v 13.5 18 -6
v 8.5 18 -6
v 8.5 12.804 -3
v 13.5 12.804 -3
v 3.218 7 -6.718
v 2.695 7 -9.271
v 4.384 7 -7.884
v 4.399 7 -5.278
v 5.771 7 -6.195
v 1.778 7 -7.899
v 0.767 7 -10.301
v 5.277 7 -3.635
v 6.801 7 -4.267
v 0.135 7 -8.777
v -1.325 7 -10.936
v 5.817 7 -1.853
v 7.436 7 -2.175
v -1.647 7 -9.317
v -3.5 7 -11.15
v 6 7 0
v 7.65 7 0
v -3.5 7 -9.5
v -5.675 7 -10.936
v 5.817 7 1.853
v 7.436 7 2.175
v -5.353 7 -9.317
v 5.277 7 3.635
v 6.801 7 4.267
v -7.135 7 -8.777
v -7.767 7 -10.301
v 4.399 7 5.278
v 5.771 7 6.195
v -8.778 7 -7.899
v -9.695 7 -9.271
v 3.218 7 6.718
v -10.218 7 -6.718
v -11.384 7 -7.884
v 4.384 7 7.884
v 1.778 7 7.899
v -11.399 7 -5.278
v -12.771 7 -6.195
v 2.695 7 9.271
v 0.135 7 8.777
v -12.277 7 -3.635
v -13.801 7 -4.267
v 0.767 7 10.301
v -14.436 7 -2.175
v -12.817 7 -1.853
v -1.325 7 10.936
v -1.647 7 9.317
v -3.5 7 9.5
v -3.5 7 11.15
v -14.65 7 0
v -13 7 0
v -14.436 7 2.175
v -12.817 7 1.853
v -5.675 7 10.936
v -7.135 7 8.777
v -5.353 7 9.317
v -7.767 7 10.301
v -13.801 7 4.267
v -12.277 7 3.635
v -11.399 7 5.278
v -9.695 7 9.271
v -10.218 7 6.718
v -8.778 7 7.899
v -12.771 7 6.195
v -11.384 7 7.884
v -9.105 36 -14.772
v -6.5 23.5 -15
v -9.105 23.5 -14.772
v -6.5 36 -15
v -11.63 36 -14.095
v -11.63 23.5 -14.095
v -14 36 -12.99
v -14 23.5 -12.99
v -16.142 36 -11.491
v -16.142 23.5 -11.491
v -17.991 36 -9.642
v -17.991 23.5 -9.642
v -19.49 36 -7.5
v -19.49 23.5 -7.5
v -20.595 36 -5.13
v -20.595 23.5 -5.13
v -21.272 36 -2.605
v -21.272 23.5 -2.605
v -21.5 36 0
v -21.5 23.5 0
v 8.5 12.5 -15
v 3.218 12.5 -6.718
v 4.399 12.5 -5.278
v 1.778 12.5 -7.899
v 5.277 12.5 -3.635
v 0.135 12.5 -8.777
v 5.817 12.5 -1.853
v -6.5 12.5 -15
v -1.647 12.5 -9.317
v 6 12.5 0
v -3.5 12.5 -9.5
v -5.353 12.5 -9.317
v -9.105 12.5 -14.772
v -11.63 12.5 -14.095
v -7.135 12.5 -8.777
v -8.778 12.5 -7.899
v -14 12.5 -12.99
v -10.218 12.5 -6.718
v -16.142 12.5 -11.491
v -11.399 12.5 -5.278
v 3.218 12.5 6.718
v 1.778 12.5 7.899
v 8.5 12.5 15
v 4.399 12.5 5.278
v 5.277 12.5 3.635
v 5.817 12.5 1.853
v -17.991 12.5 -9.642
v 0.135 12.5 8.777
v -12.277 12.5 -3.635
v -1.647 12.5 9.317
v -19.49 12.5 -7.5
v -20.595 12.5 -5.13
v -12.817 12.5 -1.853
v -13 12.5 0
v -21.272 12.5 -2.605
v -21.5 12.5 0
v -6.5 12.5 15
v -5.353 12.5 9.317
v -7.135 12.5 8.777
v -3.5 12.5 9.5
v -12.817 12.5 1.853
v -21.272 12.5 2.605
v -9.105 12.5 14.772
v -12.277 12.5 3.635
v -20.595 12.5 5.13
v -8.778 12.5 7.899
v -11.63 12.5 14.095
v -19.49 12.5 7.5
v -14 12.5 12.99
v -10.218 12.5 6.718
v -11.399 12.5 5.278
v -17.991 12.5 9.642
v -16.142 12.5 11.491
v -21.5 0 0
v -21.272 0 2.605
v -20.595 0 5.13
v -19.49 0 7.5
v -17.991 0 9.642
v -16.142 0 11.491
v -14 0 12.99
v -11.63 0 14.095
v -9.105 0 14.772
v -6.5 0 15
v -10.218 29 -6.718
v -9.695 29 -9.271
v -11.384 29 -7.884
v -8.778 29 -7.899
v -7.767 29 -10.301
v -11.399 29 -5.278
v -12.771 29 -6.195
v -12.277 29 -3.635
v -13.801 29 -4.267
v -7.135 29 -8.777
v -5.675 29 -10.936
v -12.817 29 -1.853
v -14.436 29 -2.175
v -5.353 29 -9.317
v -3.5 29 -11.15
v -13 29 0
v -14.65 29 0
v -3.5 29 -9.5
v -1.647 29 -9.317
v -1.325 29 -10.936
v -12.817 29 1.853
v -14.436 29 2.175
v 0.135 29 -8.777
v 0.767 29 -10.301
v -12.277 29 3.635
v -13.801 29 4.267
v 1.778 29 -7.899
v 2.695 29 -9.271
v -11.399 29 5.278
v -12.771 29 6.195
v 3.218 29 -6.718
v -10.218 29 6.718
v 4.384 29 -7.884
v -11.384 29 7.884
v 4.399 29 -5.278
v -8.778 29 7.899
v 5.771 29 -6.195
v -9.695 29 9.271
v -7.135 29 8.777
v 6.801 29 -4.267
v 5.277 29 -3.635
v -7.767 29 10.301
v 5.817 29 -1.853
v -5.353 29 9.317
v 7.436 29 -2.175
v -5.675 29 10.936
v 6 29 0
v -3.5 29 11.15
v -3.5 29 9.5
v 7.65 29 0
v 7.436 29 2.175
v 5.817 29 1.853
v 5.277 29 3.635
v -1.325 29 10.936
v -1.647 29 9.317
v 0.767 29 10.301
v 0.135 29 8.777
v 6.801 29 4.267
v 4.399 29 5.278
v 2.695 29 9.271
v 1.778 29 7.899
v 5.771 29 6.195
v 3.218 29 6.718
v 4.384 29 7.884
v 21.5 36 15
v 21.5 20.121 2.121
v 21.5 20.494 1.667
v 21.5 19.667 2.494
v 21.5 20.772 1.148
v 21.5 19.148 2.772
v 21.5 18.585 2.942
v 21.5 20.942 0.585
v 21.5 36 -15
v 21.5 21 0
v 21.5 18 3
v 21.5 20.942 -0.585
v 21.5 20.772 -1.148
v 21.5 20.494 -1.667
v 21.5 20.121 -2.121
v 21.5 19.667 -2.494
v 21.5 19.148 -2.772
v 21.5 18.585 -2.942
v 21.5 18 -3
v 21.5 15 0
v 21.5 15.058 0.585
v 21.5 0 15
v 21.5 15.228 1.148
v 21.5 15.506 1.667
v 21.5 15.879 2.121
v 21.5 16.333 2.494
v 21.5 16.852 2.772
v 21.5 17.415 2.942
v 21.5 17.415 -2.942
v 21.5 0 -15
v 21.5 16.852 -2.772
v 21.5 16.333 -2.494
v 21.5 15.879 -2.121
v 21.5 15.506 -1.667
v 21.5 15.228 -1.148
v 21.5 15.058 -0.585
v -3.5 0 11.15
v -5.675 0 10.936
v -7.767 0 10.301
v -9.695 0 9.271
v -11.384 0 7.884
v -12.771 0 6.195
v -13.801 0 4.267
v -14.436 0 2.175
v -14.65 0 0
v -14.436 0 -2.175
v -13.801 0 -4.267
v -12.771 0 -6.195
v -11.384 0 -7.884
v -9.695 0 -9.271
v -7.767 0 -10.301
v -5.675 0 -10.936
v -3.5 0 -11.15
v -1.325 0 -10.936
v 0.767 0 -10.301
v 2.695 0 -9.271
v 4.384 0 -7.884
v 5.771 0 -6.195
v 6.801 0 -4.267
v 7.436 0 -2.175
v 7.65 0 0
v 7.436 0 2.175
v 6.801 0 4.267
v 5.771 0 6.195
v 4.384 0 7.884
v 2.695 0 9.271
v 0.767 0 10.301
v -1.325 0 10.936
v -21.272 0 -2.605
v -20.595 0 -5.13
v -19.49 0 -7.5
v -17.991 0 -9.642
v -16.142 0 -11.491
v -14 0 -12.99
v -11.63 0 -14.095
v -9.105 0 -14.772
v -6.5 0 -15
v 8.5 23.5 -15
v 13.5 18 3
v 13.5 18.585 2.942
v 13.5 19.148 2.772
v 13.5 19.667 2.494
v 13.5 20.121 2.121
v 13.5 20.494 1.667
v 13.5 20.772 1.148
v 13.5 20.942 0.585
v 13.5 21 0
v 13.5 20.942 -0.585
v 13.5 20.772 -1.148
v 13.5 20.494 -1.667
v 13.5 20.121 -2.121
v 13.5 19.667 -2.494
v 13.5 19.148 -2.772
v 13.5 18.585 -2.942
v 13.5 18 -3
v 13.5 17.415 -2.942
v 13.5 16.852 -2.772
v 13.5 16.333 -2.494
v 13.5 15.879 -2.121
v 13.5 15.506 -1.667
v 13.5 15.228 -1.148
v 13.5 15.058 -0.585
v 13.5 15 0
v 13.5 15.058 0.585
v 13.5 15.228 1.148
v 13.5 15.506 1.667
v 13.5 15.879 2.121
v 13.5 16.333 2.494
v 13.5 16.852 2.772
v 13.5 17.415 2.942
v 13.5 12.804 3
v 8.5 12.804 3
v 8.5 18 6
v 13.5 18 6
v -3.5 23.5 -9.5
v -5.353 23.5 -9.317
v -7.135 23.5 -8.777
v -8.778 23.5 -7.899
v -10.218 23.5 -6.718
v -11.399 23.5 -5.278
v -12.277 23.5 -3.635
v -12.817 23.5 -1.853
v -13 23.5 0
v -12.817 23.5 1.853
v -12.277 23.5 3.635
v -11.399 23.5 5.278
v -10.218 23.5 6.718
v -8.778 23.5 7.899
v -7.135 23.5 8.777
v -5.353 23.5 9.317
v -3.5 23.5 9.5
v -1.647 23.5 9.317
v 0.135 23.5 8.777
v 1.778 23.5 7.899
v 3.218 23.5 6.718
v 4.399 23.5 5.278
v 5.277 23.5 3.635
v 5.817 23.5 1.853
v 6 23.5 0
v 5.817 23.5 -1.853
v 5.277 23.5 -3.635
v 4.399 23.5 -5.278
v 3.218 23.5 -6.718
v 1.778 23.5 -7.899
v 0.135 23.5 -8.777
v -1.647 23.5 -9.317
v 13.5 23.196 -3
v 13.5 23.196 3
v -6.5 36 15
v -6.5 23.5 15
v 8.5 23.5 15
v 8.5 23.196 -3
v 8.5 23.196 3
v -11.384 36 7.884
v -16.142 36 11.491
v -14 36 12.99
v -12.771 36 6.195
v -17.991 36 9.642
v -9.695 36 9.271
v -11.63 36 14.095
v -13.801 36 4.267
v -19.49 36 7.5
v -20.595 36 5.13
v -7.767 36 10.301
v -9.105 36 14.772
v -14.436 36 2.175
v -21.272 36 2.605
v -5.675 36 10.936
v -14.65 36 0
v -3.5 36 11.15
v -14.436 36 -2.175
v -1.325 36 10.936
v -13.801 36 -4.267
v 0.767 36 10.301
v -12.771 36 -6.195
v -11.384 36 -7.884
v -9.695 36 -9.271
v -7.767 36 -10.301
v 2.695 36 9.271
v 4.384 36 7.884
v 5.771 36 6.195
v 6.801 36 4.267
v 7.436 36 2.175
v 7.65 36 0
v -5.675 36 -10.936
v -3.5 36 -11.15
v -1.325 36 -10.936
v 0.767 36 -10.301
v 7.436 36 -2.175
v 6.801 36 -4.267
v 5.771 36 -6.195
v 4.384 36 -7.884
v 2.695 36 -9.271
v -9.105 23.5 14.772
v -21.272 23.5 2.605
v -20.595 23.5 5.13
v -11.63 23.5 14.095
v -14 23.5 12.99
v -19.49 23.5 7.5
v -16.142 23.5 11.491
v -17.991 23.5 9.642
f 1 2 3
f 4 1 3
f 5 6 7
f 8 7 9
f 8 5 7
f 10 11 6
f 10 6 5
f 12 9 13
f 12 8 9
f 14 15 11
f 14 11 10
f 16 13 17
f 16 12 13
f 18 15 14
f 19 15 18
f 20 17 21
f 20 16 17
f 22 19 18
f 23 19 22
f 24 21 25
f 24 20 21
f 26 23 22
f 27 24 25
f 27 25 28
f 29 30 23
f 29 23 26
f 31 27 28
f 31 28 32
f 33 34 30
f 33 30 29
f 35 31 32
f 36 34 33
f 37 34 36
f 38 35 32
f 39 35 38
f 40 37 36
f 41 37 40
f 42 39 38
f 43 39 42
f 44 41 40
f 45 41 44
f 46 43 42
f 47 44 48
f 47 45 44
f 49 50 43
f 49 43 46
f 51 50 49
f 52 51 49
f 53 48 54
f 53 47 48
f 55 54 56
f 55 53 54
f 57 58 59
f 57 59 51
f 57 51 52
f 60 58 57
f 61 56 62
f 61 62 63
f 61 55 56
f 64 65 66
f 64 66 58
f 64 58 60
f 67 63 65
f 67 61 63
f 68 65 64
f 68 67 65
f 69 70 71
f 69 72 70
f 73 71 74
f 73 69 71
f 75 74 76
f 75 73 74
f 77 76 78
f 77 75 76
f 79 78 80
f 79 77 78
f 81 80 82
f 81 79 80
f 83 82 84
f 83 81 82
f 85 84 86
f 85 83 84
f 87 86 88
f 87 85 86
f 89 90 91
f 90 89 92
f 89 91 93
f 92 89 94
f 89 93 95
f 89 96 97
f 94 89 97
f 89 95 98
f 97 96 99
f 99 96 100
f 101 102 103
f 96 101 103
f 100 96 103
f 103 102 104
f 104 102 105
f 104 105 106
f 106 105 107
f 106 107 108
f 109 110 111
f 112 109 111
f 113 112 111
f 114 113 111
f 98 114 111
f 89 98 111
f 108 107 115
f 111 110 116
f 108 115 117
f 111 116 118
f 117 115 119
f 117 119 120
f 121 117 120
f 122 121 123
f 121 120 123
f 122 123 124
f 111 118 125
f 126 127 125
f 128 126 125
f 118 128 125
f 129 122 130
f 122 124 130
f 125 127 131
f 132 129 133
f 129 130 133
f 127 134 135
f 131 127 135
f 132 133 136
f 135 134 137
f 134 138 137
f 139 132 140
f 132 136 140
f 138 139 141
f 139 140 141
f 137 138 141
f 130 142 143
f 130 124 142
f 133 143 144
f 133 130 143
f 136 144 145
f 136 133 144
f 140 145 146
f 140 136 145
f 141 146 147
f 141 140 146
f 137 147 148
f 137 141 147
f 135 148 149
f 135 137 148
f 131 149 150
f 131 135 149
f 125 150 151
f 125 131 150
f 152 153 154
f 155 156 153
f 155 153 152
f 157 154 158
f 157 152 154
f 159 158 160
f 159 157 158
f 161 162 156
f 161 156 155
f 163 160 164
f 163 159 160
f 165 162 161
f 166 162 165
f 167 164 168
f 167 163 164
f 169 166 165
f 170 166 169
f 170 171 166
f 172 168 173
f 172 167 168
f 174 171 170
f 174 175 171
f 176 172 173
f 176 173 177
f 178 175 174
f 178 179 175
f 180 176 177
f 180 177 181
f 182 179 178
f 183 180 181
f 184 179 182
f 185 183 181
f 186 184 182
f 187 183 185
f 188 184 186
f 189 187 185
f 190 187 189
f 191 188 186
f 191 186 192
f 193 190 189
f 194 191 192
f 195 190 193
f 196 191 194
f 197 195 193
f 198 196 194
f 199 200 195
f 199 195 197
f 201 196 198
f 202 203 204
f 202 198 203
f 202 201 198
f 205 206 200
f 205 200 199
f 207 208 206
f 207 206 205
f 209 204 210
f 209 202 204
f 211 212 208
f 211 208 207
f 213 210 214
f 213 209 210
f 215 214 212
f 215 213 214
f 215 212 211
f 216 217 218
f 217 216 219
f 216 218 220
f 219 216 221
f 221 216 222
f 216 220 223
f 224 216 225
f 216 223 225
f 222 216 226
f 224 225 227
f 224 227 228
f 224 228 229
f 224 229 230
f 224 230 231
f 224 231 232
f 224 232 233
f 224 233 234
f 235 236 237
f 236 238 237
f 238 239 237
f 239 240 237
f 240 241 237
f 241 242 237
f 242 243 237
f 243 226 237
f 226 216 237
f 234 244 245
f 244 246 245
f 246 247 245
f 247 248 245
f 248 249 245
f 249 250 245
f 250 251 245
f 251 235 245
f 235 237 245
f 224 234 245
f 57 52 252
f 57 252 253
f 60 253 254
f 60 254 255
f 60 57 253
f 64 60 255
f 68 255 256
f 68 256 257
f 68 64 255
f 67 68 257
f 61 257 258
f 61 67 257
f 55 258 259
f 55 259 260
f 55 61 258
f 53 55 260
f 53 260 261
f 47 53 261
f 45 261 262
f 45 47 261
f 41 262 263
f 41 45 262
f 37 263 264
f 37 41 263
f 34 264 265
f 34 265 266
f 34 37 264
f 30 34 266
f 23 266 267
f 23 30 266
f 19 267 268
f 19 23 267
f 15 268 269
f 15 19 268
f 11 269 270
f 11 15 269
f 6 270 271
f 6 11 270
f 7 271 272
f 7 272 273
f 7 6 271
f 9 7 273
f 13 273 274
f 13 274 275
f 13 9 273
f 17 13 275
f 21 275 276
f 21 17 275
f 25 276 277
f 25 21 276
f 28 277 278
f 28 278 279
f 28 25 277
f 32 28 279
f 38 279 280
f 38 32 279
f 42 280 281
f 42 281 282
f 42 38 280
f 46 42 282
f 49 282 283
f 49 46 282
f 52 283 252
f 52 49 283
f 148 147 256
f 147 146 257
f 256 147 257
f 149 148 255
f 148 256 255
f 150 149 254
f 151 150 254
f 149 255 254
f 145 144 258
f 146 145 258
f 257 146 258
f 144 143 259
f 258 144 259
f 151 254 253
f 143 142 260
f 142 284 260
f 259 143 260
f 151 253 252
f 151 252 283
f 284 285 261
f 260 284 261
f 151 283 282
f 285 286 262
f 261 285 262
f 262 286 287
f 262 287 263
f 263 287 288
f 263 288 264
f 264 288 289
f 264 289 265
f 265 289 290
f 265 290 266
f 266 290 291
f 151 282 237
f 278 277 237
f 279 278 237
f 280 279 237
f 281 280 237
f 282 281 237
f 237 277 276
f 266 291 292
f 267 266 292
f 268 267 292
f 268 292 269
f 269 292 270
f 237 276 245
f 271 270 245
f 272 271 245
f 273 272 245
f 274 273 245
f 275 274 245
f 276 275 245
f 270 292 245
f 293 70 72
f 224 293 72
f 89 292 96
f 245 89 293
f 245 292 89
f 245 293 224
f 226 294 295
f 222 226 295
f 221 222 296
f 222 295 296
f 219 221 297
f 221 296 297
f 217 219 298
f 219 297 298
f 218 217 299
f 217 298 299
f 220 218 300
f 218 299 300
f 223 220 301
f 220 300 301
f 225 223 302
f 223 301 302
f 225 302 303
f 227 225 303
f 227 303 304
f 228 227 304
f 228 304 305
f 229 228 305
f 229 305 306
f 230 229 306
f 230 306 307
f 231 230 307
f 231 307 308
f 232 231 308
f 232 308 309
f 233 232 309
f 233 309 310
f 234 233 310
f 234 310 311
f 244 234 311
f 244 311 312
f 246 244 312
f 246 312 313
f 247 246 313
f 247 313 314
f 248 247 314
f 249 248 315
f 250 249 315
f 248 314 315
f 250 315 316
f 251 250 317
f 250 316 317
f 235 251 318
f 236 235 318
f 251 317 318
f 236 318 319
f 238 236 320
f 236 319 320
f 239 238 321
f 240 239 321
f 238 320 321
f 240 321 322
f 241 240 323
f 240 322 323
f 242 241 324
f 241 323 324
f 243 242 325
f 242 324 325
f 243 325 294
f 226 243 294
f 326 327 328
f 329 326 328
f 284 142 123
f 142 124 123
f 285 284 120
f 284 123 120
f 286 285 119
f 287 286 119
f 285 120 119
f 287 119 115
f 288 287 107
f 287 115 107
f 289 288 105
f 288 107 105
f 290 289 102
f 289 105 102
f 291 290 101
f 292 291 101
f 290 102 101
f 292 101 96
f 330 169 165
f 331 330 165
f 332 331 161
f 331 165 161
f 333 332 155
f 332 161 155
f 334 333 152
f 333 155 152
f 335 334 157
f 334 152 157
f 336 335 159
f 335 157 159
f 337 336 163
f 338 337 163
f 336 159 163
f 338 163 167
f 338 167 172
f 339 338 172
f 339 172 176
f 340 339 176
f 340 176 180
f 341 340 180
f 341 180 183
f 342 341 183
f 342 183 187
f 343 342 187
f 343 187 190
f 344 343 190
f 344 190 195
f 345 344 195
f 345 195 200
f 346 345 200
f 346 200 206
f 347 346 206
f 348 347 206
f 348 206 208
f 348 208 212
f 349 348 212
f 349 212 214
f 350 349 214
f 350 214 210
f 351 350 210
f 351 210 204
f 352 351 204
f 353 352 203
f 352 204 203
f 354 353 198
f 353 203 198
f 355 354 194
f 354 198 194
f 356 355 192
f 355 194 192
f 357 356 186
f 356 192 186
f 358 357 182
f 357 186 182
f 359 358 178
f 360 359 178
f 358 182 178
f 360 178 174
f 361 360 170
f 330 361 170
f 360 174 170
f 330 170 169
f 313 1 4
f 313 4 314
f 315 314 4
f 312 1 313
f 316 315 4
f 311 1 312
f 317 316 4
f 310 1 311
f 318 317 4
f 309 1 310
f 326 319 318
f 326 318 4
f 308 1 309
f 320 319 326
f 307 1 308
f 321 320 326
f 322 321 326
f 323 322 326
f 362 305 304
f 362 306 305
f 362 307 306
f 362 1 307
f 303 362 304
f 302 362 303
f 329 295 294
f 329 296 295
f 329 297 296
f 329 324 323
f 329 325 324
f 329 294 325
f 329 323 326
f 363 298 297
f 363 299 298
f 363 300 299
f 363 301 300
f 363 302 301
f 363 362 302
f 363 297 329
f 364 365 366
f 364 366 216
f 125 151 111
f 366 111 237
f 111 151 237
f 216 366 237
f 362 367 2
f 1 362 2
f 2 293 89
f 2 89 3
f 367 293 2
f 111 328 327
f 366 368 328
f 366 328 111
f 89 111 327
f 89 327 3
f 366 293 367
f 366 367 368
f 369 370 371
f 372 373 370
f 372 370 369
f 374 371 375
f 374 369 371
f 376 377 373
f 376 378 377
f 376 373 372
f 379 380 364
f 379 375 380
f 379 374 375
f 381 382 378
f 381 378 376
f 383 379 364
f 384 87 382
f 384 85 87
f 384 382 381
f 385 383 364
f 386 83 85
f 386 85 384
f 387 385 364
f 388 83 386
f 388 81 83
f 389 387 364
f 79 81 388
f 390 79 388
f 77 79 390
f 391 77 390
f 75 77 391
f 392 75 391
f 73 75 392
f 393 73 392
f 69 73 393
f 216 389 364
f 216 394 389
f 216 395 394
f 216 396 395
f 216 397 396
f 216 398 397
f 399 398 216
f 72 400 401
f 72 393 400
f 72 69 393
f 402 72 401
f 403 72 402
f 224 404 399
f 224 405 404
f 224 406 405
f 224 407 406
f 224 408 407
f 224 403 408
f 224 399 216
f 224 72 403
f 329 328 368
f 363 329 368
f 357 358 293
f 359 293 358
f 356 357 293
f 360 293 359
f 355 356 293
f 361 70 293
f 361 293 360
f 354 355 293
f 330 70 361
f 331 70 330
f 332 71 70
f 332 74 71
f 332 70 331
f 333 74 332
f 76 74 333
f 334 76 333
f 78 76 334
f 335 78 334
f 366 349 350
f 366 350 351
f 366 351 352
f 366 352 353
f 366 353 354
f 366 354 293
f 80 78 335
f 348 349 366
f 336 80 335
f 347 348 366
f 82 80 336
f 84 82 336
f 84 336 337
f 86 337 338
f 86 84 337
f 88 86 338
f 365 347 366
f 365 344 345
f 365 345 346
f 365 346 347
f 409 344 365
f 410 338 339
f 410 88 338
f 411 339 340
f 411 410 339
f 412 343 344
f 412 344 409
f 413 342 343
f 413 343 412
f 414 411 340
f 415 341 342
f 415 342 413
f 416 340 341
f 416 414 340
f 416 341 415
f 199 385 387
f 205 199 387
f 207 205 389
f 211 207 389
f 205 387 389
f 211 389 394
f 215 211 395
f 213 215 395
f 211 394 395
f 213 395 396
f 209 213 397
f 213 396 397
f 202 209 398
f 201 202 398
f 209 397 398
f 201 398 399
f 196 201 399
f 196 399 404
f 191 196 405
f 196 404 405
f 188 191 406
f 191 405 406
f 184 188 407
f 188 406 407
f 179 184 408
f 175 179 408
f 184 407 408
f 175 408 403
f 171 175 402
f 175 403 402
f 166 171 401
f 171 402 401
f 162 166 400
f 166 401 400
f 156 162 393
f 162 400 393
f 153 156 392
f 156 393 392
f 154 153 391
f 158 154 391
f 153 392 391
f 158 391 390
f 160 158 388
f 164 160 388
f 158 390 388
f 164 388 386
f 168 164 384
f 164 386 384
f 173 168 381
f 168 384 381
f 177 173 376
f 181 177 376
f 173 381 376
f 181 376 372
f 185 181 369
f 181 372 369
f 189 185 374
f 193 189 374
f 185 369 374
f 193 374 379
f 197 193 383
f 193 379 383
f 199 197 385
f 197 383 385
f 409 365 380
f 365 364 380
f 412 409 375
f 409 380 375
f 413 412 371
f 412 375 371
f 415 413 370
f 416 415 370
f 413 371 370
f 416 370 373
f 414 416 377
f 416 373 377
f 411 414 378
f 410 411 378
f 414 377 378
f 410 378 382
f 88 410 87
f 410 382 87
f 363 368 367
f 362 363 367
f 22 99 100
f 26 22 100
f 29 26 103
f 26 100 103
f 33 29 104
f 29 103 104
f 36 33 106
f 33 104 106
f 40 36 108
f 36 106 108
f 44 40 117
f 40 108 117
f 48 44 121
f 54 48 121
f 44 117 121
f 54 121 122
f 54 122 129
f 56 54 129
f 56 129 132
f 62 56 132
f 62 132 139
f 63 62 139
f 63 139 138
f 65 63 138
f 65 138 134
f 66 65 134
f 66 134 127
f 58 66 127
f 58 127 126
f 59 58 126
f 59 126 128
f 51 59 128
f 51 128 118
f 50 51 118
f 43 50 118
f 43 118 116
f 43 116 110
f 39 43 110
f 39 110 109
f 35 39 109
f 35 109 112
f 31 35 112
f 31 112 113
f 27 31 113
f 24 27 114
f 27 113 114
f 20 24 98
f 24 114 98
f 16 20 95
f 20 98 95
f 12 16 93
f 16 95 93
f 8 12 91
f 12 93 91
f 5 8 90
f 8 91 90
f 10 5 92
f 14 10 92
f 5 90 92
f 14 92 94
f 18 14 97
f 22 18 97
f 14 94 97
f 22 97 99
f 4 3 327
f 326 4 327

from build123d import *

# Parameters (mm, degrees)
SKETCH1_W           = 43
SKETCH1_H           = 30
BOSS_EXTRUDE1_DEPTH = 36
SKETCH2_W           = 30
SKETCH2_H           = 11
CUT_EXTRUDE1_DEPTH  = 30
SKETCH3_R           = 11.15
CUT_EXTRUDE2_DEPTH  = 7
CUT_EXTRUDE3_START  = -7
SKETCH4_R           = 11.15
CUT_EXTRUDE3_DEPTH  = 7
SKETCH5_R           = 9.5
CUT_EXTRUDE4_DEPTH  = 40.092838219
CUT_EXTRUDE5_DEPTH  = 5
SKETCH7_R           = 3
CUT_EXTRUDE6_DEPTH  = 53.402290026
FILLET2_R           = 15


with BuildPart() as part:
    # Sketch1 → Boss-Extrude1 (new body)
    with BuildSketch(Plane(origin=(0, 0, 0), x_dir=(1, 0, 0), z_dir=(0, 1, 0))):
        Rectangle(SKETCH1_W, SKETCH1_H)
    extrude(amount=BOSS_EXTRUDE1_DEPTH)

    # Sketch2 → Cut-Extrude1 (cut)
    with BuildSketch(Plane.ZY.offset(21.5)):
        with Locations((0, 18)):
            Rectangle(SKETCH2_W, SKETCH2_H)
    extrude(amount=-CUT_EXTRUDE1_DEPTH, mode=Mode.SUBTRACT)

    # Sketch3 → Cut-Extrude2 (cut)
    with BuildSketch(Plane(origin=(0, 36, 0), x_dir=(1, 0, 0), z_dir=(0, 1, 0))):
        with Locations(Location((-3.5, 0, 0), (0, 0, 270))):
            Circle(SKETCH3_R)
    extrude(amount=-CUT_EXTRUDE2_DEPTH, mode=Mode.SUBTRACT)

    # Sketch4 → Cut-Extrude3 (cut)
    with BuildSketch(Plane.XZ.offset(CUT_EXTRUDE3_START)):
        with Locations(Location((-3.5, 0, 0), (0, 0, 90))):
            Circle(SKETCH4_R)
    extrude(amount=CUT_EXTRUDE3_DEPTH, mode=Mode.SUBTRACT)

    # Sketch5 → Cut-Extrude4 (cut, through all)
    with BuildSketch(Plane(origin=(0, 29, 0), x_dir=(1, 0, 0), z_dir=(0, 1, 0))):
        with Locations(Location((-3.5, 0, 0), (0, 0, 90))):
            Circle(SKETCH5_R)
    extrude(amount=-CUT_EXTRUDE4_DEPTH, mode=Mode.SUBTRACT)

    # Sketch6 → Cut-Extrude5 (cut)
    with BuildSketch(Plane.ZY.offset(-8.5)):
        Polygon((-3, 23.196152423), (-6, 18), (-3, 12.803847577), (3, 12.803847577), (6, 18), (3, 23.196152423), align=None)
    extrude(amount=-CUT_EXTRUDE5_DEPTH, mode=Mode.SUBTRACT)

    # Sketch7 → Cut-Extrude6 (cut, through all)
    with BuildSketch(Plane.ZY.offset(-13.5)):
        with Locations((0, 18)):
            Circle(SKETCH7_R)
    extrude(amount=-CUT_EXTRUDE6_DEPTH, mode=Mode.SUBTRACT)

    # Fillet2
    fillet2_edges = [part.edges().sort_by_distance(p)[0] for p in [
        (-21.5, 6.25, -15),
        (-21.5, 6.25, 15),
        (-21.5, 29.75, 15),
        (-21.5, 29.75, -15),
    ]]
    fillet(fillet2_edges, radius=FILLET2_R - 0.0001)  # a hair under: the kernel refuses the full size


solid = part.part
